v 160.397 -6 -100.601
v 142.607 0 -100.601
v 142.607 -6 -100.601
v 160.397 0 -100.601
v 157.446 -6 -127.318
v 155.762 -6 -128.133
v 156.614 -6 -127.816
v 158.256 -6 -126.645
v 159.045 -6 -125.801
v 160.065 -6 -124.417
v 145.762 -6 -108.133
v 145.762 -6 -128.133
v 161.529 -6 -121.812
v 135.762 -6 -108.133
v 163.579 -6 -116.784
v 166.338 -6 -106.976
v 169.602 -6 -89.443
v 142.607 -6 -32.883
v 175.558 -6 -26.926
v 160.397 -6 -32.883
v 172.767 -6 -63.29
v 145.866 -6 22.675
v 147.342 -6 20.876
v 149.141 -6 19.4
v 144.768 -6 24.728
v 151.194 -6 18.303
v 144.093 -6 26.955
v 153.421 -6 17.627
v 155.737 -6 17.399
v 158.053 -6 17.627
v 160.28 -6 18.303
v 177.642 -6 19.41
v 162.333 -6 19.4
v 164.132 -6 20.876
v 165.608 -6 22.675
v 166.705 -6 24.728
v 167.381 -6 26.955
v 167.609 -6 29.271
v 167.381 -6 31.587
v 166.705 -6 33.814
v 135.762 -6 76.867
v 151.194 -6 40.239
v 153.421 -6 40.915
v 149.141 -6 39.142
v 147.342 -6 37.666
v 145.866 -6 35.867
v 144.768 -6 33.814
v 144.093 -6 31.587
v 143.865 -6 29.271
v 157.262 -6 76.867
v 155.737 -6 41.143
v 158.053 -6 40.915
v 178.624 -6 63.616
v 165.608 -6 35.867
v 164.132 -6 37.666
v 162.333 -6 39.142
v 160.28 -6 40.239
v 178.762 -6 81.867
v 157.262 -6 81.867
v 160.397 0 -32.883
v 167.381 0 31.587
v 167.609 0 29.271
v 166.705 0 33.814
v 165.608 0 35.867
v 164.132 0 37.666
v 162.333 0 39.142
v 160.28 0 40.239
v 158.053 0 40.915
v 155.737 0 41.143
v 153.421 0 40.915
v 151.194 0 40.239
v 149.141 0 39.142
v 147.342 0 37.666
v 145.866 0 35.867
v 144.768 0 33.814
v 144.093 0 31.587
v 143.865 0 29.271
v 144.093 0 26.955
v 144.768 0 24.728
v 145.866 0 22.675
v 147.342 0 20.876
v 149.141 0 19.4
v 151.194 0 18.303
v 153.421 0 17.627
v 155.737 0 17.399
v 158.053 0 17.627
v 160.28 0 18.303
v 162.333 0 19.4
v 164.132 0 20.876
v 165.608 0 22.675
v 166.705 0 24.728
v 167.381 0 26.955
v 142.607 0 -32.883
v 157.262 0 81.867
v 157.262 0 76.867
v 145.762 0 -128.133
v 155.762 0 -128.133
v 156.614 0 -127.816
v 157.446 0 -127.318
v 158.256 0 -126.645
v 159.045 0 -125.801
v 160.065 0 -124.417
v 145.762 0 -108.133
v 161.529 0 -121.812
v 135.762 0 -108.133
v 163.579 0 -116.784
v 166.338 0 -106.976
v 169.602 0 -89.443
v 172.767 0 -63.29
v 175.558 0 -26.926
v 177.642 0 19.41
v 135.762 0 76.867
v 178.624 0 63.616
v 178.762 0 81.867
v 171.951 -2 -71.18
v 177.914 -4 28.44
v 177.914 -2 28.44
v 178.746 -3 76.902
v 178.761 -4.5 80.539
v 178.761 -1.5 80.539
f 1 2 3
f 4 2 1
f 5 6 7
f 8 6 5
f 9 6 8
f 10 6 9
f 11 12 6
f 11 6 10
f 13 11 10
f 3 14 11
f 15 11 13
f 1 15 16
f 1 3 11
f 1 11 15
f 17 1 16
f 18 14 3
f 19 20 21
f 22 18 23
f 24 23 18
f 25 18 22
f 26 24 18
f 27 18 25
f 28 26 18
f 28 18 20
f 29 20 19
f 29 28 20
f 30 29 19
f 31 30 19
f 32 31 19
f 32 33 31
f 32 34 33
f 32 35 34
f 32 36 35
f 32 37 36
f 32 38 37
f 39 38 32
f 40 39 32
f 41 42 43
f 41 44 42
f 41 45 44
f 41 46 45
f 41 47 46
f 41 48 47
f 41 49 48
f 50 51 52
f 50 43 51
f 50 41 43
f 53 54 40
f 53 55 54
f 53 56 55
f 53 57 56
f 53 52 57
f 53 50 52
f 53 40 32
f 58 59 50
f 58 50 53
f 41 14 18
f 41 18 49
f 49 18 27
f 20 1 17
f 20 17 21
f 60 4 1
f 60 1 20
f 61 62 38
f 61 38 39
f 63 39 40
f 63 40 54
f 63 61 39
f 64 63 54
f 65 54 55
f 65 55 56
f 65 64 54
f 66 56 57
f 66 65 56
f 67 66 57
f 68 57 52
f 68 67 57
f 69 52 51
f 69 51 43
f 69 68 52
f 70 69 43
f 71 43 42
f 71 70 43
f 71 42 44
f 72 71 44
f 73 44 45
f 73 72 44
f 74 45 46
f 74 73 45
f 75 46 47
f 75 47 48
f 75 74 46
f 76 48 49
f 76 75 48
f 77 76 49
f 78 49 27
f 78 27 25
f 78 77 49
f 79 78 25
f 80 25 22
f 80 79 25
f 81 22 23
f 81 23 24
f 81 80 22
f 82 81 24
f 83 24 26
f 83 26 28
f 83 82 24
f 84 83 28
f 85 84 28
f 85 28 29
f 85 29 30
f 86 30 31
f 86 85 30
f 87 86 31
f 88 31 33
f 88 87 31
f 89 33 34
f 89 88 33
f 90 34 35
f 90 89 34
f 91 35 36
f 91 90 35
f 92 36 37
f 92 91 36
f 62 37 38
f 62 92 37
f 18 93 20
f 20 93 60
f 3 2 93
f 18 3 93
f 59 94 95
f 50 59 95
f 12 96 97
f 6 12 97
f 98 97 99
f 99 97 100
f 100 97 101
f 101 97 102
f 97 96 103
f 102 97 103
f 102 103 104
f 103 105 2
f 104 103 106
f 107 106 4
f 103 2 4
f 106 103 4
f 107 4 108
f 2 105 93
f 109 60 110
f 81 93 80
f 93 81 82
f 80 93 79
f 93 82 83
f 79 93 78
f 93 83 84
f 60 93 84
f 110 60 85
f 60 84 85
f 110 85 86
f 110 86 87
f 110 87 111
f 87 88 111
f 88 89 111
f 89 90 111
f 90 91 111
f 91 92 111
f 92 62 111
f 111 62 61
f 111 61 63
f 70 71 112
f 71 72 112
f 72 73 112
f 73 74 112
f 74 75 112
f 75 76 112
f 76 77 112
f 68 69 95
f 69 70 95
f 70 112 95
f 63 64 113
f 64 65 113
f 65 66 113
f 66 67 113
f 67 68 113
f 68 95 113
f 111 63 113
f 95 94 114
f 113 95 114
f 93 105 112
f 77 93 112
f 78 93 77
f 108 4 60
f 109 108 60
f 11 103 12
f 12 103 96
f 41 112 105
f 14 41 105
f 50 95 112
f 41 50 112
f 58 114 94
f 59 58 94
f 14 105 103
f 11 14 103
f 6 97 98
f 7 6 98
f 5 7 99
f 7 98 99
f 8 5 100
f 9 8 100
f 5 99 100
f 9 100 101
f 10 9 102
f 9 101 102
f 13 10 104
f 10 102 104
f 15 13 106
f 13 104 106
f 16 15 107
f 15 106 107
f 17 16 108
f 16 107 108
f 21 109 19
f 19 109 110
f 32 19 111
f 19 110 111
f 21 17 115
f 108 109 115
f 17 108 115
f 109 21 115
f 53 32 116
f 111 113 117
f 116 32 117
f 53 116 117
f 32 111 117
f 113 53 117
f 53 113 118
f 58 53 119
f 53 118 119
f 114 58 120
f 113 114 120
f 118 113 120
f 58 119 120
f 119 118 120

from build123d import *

# Parameters (mm, degrees)
F0_W     = 17.790004611
F0_H     = 67.7184760571
F0_R     = 11.8720680475
F1_DEPTH = 6


# Not quite as in the source:
# - a feature names something its author has since deleted; it is built from what else it names


with BuildPart() as f1:
    # F0 (on Front) → F1 (new body)
    with BuildSketch(Plane.XZ):
        with BuildLine():
            add(Edge.make_bspline(
                [(155.761959786, -128.1328057871), (178.7677402867, -122.1328057871), (178.7677402867, 81.1552154075), (178.761959786, 81.8671942129)],
                knots=[0, 0, 0, 0, 211.255769152, 211.255769152, 211.255769152, 211.255769152], degree=3))
            Line((178.761959786, 81.8671942129), (157.261959786, 81.8671942129))
            Line((157.261959786, 81.8671942129), (157.261959786, 76.8671942129))
            Line((157.261959786, 76.8671942129), (135.761959786, 76.8671942129))
            Line((135.761959786, 76.8671942129), (135.761959786, -108.1328057871))
            Line((135.761959786, -108.1328057871), (145.761959786, -108.1328057871))
            Line((145.761959786, -108.1328057871), (145.761959786, -128.1328057871))
            Line((145.761959786, -128.1328057871), (155.761959786, -128.1328057871))
        make_face()
        with Locations((151.5024825931, -66.7420731425)):
            Rectangle(F0_W, F0_H, mode=Mode.SUBTRACT)
        with Locations((155.7367742062, 29.270966208)):
            Circle(F0_R, mode=Mode.SUBTRACT)
    extrude(amount=F1_DEPTH)


solid = f1.part
